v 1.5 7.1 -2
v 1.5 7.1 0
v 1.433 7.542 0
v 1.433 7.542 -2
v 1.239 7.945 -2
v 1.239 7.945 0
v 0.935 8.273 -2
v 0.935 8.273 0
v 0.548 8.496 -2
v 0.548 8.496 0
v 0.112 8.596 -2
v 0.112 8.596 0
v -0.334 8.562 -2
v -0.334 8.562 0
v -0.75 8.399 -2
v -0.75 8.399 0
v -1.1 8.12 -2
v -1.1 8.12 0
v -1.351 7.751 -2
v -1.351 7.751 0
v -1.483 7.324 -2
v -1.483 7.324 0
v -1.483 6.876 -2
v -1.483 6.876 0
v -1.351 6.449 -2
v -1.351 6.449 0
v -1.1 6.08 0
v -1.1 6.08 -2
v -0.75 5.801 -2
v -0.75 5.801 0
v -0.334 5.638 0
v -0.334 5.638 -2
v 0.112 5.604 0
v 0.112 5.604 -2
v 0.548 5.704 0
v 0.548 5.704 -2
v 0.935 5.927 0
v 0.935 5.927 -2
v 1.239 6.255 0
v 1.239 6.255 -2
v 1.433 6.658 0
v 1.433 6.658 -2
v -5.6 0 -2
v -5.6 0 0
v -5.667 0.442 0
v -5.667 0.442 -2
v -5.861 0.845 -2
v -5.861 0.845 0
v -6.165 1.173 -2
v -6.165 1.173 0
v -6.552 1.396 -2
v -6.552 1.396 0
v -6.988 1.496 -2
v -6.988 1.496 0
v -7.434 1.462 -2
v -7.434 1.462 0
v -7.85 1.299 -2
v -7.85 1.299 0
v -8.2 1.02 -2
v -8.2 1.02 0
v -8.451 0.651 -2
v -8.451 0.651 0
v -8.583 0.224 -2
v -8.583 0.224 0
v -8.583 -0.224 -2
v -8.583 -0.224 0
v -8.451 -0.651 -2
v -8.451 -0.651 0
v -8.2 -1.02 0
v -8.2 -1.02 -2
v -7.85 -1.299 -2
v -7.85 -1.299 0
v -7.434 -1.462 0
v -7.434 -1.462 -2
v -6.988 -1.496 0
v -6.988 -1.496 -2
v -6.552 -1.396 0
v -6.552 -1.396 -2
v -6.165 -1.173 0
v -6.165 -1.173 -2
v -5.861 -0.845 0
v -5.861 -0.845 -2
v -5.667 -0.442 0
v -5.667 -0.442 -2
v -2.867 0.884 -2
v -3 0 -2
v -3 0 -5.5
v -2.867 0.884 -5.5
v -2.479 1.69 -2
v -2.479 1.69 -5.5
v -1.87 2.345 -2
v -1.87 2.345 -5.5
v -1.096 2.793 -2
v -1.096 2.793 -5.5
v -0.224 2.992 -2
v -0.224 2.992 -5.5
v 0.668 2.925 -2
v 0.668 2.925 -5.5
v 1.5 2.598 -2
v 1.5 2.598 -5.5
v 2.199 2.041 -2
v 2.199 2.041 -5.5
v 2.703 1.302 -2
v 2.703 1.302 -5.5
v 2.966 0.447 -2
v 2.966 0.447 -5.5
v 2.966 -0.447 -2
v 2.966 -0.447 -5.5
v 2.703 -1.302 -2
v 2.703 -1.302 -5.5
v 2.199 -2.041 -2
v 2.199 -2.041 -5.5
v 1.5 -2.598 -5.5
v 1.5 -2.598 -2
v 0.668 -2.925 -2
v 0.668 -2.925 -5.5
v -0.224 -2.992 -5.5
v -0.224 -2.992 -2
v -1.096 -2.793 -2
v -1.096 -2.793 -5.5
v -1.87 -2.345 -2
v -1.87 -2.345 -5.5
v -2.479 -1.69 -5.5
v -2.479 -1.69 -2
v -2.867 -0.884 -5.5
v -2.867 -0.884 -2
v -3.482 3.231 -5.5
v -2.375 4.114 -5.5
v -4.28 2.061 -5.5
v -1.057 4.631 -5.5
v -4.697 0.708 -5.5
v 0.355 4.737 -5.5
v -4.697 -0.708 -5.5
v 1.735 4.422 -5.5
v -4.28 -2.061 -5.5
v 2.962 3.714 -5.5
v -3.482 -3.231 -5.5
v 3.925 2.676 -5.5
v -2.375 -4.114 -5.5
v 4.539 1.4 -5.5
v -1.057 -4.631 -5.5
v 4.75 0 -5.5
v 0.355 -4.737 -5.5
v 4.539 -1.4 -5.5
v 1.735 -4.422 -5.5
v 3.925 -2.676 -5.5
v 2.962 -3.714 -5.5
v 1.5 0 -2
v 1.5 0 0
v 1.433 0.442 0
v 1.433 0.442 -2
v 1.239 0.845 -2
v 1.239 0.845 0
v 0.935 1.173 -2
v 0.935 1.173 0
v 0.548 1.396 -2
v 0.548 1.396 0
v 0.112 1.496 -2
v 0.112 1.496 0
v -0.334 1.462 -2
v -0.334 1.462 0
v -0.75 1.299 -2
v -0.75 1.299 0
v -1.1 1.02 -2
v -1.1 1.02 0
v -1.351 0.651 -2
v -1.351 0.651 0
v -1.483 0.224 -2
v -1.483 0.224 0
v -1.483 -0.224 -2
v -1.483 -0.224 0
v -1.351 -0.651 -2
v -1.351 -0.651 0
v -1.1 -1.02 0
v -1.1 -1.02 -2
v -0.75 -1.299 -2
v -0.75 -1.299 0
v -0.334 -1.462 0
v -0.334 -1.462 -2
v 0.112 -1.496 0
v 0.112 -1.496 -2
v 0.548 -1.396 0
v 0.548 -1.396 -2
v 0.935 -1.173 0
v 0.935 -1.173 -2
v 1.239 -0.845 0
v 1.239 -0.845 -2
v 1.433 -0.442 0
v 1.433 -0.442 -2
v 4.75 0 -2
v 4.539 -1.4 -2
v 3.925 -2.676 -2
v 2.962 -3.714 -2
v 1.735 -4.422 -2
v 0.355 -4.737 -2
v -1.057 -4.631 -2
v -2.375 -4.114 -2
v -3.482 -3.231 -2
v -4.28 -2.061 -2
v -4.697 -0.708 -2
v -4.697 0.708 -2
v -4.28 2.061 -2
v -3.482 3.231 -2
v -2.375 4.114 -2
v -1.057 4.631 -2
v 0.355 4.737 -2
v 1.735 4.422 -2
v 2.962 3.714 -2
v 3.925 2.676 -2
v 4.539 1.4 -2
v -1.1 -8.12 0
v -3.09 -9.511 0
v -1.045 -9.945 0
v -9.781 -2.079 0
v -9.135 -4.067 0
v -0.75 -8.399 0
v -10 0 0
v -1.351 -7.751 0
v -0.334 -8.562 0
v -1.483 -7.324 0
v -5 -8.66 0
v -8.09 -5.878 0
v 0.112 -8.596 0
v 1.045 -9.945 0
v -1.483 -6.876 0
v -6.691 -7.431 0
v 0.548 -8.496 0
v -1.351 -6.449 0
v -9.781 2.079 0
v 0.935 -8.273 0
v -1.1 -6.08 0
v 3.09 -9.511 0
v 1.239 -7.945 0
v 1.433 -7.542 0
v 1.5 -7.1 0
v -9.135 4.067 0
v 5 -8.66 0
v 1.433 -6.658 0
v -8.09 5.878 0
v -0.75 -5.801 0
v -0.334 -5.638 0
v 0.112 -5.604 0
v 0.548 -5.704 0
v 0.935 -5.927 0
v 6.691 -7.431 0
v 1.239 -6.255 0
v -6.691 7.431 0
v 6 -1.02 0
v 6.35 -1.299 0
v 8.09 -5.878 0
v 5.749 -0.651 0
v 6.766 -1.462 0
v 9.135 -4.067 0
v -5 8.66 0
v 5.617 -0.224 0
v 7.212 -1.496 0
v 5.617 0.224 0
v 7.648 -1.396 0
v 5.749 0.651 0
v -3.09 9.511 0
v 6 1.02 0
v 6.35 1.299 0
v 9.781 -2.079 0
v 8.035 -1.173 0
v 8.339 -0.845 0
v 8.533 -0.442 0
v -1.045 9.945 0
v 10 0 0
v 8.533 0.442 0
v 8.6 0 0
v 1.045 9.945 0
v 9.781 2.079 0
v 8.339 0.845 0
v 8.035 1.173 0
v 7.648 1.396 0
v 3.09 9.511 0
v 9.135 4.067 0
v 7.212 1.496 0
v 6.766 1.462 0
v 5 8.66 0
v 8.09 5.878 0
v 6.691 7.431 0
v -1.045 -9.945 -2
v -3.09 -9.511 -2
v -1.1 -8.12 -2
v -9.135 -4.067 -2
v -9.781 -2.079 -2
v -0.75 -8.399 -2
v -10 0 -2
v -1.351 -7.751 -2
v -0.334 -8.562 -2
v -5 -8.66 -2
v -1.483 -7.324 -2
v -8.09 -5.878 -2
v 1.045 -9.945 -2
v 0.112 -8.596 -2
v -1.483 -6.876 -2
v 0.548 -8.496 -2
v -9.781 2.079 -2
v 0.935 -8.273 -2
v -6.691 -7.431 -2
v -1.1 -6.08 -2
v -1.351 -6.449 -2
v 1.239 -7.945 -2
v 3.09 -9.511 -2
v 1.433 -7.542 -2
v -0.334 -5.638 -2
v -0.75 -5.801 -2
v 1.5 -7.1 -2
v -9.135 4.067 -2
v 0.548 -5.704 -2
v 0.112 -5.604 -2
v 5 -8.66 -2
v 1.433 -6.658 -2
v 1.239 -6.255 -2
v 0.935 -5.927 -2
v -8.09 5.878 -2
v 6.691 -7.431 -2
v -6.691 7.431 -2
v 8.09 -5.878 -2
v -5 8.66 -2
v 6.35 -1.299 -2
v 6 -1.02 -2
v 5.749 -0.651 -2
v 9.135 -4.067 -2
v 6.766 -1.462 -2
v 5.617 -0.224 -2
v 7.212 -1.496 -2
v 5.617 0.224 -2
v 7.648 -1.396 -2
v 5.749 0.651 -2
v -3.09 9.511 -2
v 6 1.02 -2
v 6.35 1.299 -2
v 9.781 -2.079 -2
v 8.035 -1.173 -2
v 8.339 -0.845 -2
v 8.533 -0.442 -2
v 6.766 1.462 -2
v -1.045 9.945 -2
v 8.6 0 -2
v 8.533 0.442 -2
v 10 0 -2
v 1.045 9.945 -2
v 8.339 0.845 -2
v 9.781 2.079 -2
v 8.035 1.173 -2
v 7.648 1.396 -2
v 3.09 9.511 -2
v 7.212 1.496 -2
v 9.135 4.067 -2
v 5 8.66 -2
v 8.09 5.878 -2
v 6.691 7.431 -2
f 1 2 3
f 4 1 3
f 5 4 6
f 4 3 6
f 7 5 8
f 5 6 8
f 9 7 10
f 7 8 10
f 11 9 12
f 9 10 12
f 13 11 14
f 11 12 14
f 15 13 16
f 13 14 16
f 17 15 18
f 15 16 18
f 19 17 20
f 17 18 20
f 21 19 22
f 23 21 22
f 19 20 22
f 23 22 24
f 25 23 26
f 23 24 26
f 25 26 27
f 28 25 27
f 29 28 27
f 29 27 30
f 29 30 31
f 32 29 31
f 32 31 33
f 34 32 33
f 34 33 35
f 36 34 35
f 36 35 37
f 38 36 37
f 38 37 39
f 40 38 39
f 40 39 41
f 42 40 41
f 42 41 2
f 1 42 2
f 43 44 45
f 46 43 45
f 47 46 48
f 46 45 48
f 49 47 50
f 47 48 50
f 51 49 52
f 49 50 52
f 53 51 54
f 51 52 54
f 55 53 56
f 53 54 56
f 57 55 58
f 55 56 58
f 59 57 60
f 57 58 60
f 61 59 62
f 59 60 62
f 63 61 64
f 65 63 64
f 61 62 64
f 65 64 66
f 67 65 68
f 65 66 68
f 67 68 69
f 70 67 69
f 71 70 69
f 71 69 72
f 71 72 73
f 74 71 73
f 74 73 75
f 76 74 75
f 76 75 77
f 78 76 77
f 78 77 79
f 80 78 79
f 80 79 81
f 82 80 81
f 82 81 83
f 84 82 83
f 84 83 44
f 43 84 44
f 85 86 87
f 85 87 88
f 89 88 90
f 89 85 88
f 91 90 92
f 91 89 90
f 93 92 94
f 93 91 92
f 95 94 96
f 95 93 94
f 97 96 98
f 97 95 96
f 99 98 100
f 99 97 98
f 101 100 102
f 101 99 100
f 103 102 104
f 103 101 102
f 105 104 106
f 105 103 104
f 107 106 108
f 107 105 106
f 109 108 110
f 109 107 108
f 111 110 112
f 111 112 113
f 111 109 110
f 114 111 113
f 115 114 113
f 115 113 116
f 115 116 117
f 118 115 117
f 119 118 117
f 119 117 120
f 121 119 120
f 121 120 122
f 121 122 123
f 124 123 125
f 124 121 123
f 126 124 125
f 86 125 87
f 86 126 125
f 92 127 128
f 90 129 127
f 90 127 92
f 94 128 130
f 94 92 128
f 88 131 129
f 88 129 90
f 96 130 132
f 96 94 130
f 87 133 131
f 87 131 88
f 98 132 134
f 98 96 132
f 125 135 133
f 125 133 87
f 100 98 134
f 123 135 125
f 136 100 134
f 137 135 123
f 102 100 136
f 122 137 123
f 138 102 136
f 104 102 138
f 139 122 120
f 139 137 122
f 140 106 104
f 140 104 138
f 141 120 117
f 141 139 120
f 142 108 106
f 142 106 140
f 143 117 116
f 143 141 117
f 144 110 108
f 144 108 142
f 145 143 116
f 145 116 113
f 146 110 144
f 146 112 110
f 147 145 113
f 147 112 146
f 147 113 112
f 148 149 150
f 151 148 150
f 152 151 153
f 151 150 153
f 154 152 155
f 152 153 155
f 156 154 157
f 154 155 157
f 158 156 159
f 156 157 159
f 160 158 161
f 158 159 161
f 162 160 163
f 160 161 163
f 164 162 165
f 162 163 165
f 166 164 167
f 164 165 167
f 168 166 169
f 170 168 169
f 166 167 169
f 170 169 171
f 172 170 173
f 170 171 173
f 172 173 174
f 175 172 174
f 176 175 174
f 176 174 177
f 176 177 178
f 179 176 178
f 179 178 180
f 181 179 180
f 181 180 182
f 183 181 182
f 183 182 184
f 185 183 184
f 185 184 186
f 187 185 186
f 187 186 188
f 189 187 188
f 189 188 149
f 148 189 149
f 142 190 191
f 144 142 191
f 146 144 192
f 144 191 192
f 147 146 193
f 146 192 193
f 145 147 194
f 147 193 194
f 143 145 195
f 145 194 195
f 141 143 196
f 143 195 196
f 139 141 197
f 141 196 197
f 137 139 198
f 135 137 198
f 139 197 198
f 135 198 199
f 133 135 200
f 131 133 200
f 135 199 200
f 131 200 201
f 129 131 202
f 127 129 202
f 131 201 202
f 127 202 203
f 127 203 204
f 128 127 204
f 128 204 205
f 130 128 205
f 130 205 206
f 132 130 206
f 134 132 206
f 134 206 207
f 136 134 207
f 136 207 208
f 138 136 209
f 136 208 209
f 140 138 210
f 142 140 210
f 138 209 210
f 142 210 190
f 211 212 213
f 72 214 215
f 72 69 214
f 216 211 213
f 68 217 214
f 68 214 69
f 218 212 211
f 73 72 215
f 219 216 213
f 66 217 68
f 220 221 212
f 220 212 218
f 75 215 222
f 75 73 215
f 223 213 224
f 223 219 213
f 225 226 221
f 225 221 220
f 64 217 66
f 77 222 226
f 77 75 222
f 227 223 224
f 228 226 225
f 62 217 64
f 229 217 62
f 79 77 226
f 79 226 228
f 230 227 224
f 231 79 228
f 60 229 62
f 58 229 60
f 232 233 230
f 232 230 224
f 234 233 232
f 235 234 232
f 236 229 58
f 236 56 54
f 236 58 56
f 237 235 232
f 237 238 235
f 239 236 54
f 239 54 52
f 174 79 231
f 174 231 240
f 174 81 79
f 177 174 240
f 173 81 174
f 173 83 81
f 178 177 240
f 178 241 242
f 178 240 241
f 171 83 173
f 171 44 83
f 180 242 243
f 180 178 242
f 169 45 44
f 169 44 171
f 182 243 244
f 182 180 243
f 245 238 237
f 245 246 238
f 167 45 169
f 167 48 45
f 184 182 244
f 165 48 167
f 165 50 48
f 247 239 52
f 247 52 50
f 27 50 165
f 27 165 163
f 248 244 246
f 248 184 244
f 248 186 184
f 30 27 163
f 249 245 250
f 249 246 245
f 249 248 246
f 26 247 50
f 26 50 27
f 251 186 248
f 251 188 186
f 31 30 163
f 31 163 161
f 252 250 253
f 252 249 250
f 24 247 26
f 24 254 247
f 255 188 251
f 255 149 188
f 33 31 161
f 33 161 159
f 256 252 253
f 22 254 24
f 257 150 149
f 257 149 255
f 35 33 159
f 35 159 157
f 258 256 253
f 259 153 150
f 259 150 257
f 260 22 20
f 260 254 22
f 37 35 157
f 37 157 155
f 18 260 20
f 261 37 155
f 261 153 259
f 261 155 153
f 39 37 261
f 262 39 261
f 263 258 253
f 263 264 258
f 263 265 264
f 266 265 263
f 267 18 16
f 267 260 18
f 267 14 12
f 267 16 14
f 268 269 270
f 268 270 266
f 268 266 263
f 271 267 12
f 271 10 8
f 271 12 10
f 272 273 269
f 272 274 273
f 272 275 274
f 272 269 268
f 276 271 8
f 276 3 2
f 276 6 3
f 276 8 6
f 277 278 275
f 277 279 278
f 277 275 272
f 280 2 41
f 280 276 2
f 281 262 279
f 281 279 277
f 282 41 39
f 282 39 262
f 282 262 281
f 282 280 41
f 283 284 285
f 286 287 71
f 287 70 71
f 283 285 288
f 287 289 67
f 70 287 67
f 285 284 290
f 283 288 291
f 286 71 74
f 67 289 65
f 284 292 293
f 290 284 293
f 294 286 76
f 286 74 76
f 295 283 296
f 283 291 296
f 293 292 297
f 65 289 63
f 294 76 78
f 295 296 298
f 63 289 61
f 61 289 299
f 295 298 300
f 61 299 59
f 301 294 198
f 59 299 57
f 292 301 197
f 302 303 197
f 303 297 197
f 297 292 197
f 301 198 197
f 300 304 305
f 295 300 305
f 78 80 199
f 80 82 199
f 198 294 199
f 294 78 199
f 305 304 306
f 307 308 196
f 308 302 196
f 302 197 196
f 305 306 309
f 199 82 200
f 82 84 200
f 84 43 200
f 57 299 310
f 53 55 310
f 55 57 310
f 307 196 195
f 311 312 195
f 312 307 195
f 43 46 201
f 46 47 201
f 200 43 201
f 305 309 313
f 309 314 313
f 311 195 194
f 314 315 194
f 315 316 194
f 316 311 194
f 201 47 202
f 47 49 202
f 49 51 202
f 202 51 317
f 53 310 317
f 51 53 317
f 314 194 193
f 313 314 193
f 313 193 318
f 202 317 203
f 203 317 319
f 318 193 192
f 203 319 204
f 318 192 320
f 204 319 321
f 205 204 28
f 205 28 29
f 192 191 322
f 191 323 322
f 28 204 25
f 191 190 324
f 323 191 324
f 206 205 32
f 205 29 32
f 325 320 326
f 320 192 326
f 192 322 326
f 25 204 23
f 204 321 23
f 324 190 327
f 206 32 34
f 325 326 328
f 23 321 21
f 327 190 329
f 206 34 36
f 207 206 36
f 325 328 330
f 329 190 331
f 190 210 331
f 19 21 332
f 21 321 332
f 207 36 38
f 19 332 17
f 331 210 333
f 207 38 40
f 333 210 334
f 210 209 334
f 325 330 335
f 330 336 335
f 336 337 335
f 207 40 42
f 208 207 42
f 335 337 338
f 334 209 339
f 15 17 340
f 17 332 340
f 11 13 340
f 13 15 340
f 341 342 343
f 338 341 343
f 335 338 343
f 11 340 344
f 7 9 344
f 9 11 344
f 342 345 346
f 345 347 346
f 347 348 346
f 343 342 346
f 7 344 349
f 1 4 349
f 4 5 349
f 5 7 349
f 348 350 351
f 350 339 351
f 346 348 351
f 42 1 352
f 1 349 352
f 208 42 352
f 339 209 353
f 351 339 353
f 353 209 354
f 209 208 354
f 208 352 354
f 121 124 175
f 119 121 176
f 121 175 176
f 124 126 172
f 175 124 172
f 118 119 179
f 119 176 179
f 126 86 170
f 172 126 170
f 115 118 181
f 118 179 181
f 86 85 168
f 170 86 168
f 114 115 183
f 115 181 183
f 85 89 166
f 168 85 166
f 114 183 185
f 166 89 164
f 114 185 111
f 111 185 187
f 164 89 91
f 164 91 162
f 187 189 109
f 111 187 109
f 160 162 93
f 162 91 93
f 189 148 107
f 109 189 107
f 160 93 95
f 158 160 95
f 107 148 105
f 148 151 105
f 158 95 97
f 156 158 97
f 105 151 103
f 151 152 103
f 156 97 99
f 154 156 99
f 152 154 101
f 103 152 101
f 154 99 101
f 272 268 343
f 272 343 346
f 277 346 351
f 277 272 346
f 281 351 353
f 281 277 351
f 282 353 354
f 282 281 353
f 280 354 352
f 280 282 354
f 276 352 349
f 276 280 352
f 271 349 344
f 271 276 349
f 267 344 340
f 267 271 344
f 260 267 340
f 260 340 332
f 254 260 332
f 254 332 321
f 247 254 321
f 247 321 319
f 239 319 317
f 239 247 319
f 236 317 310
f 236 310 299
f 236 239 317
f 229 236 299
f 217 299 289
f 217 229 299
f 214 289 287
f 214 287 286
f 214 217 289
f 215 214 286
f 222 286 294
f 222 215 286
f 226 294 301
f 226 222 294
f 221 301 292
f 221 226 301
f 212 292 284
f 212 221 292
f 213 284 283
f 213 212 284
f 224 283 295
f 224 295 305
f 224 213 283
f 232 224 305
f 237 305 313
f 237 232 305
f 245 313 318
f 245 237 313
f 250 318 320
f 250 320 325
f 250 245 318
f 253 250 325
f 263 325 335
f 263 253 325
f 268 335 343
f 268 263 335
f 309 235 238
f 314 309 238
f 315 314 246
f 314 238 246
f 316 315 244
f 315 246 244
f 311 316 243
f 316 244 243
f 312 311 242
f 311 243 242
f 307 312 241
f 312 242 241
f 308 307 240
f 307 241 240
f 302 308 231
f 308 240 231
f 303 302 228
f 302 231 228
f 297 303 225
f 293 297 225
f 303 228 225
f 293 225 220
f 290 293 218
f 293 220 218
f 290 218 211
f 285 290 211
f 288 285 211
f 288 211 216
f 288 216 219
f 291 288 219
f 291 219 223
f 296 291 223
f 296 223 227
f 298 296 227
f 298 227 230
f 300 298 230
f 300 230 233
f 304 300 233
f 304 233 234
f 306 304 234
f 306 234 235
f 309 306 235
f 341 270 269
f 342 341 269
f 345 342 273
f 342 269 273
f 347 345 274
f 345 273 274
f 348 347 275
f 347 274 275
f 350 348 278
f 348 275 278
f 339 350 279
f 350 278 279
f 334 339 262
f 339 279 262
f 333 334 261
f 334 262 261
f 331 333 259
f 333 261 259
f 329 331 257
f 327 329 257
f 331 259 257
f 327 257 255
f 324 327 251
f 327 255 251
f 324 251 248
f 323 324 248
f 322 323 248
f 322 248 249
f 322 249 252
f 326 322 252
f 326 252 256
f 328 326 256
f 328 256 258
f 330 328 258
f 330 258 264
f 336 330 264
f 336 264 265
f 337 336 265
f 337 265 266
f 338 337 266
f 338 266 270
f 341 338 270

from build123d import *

# Parameters (mm, degrees)
SKETCH_1_R          = 10
EXTRUDE_1_DEPTH     = 2
CUT_EXTRUDE_1_REACH = 16.283
SKETCH_2_R          = 1.5
SKETCH_3_R          = 4.75
SKETCH_3_R_2        = 3
EXTRUDE_2_DEPTH     = 3.5


with BuildPart() as part:
    # 草图1 → 凸台-拉伸1 (new body)
    with BuildSketch(Plane.XY):
        Circle(SKETCH_1_R)
    extrude(amount=-EXTRUDE_1_DEPTH)

    # 草图2 → 切除-拉伸1 (cut, up to next)
    with BuildSketch(Plane.XY, mode=Mode.PRIVATE) as cut_extrude_1_sk1:
        Circle(SKETCH_2_R)
    cut_extrude_1_tool1 = extrude(cut_extrude_1_sk1.sketch, amount=-CUT_EXTRUDE_1_REACH, mode=Mode.PRIVATE) & part.part
    # 草图2 → 切除-拉伸1 (cut, up to next)
    with BuildSketch(Plane.XY, mode=Mode.PRIVATE) as cut_extrude_1_sk2:
        with Locations((-7.1, 0)):
            Circle(SKETCH_2_R)
    cut_extrude_1_tool2 = extrude(cut_extrude_1_sk2.sketch, amount=-CUT_EXTRUDE_1_REACH, mode=Mode.PRIVATE) & part.part
    # 草图2 → 切除-拉伸1 (cut, up to next)
    with BuildSketch(Plane.XY, mode=Mode.PRIVATE) as cut_extrude_1_sk3:
        with Locations((0, 7.1)):
            Circle(SKETCH_2_R)
    cut_extrude_1_tool3 = extrude(cut_extrude_1_sk3.sketch, amount=-CUT_EXTRUDE_1_REACH, mode=Mode.PRIVATE) & part.part
    # 草图2 → 切除-拉伸1 (cut, up to next)
    with BuildSketch(Plane.XY, mode=Mode.PRIVATE) as cut_extrude_1_sk4:
        with Locations((7.1, 0)):
            Circle(SKETCH_2_R)
    cut_extrude_1_tool4 = extrude(cut_extrude_1_sk4.sketch, amount=-CUT_EXTRUDE_1_REACH, mode=Mode.PRIVATE) & part.part
    # 草图2 → 切除-拉伸1 (cut, up to next)
    with BuildSketch(Plane.XY, mode=Mode.PRIVATE) as cut_extrude_1_sk5:
        with Locations((0, -7.1)):
            Circle(SKETCH_2_R)
    cut_extrude_1_tool5 = extrude(cut_extrude_1_sk5.sketch, amount=-CUT_EXTRUDE_1_REACH, mode=Mode.PRIVATE) & part.part
    add(cut_extrude_1_tool1.solids().sort_by_distance((0, 0, 0))[0], mode=Mode.SUBTRACT)
    add(cut_extrude_1_tool2.solids().sort_by_distance((-7.1, 0, 0))[0], mode=Mode.SUBTRACT)
    add(cut_extrude_1_tool3.solids().sort_by_distance((0, 7.1, 0))[0], mode=Mode.SUBTRACT)
    add(cut_extrude_1_tool4.solids().sort_by_distance((7.1, 0, 0))[0], mode=Mode.SUBTRACT)
    add(cut_extrude_1_tool5.solids().sort_by_distance((0, -7.1, 0))[0], mode=Mode.SUBTRACT)

    # 草图3 → 凸台-拉伸2 (add)
    with BuildSketch(Plane(origin=(0, 0, -2), x_dir=(-1, 0, 0), z_dir=(0, 0, -1))):
        with Locations(Location((0, 0, 0), (0, 0, 180))):
            Circle(SKETCH_3_R)
        Circle(SKETCH_3_R_2, mode=Mode.SUBTRACT)
    extrude(amount=EXTRUDE_2_DEPTH)


solid = part.part
